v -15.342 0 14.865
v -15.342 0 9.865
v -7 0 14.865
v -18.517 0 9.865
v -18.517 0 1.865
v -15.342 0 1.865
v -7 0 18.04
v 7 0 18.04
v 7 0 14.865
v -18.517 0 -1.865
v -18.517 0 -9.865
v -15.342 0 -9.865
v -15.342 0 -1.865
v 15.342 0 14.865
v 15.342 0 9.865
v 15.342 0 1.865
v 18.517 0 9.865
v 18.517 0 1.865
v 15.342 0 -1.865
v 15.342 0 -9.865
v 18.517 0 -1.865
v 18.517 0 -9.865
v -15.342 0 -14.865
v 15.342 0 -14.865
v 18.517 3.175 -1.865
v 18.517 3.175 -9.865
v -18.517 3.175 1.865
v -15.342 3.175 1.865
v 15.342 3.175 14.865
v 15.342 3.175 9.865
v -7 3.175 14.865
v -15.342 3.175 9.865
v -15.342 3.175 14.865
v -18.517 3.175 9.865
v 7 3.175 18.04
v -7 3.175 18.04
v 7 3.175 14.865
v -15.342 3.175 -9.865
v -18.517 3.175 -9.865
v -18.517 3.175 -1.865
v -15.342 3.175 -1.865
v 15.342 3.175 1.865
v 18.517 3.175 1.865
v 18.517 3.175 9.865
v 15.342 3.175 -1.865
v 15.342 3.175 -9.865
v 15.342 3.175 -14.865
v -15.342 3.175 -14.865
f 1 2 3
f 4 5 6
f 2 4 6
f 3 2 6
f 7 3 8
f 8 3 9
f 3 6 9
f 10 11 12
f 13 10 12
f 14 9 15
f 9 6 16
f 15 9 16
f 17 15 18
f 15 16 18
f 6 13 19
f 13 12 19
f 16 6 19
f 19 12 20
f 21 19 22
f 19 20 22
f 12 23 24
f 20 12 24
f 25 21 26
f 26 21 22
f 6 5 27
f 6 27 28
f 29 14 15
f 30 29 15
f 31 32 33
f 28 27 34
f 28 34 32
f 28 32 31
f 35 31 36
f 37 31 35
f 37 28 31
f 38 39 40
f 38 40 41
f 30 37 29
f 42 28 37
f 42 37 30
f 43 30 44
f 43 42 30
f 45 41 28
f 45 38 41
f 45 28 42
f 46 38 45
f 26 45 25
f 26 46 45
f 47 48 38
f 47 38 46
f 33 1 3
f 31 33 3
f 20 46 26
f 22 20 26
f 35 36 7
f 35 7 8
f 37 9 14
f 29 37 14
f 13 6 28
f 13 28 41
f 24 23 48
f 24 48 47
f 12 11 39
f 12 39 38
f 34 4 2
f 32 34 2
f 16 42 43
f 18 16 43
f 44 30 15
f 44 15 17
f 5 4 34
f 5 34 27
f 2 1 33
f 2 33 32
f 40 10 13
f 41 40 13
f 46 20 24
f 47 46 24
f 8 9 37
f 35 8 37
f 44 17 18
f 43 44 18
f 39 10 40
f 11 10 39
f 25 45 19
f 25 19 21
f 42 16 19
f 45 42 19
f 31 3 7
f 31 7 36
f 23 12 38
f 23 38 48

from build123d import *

# Parameters (mm, degrees)
SKETCH1_W           = 3.175
SKETCH1_H           = 8
SKETCH1_W_2         = 30.6846
SKETCH1_H_2         = 29.73
BOSS_EXTRUDE1_DEPTH = 3.175
SKETCH2_W           = 14
SKETCH2_H           = 3.175
BOSS_EXTRUDE5_DEPTH = 3.175


with BuildPart() as part:
    # Sketch1 → Boss-Extrude1 (new body)
    with BuildSketch(Plane(origin=(0, 0, 0), x_dir=(1, 0, 0), z_dir=(0, 1, 0))):
        with Locations((-16.9298, 5.865)):
            Rectangle(SKETCH1_W, SKETCH1_H)
        Rectangle(SKETCH1_W_2, SKETCH1_H_2)
        with Locations((16.9298, -5.865)):
            Rectangle(SKETCH1_W, SKETCH1_H)
        with Locations((16.9298, 5.865)):
            Rectangle(SKETCH1_W, SKETCH1_H)
        with Locations((-16.9298, -5.865)):
            Rectangle(SKETCH1_W, SKETCH1_H)
    extrude(amount=BOSS_EXTRUDE1_DEPTH)

    # Sketch2 → Boss-Extrude5 (add)
    with BuildSketch(Plane.XY.offset(14.865)):
        with Locations((0, 1.5875)):
            Rectangle(SKETCH2_W, SKETCH2_H)
    extrude(amount=BOSS_EXTRUDE5_DEPTH)


solid = part.part
